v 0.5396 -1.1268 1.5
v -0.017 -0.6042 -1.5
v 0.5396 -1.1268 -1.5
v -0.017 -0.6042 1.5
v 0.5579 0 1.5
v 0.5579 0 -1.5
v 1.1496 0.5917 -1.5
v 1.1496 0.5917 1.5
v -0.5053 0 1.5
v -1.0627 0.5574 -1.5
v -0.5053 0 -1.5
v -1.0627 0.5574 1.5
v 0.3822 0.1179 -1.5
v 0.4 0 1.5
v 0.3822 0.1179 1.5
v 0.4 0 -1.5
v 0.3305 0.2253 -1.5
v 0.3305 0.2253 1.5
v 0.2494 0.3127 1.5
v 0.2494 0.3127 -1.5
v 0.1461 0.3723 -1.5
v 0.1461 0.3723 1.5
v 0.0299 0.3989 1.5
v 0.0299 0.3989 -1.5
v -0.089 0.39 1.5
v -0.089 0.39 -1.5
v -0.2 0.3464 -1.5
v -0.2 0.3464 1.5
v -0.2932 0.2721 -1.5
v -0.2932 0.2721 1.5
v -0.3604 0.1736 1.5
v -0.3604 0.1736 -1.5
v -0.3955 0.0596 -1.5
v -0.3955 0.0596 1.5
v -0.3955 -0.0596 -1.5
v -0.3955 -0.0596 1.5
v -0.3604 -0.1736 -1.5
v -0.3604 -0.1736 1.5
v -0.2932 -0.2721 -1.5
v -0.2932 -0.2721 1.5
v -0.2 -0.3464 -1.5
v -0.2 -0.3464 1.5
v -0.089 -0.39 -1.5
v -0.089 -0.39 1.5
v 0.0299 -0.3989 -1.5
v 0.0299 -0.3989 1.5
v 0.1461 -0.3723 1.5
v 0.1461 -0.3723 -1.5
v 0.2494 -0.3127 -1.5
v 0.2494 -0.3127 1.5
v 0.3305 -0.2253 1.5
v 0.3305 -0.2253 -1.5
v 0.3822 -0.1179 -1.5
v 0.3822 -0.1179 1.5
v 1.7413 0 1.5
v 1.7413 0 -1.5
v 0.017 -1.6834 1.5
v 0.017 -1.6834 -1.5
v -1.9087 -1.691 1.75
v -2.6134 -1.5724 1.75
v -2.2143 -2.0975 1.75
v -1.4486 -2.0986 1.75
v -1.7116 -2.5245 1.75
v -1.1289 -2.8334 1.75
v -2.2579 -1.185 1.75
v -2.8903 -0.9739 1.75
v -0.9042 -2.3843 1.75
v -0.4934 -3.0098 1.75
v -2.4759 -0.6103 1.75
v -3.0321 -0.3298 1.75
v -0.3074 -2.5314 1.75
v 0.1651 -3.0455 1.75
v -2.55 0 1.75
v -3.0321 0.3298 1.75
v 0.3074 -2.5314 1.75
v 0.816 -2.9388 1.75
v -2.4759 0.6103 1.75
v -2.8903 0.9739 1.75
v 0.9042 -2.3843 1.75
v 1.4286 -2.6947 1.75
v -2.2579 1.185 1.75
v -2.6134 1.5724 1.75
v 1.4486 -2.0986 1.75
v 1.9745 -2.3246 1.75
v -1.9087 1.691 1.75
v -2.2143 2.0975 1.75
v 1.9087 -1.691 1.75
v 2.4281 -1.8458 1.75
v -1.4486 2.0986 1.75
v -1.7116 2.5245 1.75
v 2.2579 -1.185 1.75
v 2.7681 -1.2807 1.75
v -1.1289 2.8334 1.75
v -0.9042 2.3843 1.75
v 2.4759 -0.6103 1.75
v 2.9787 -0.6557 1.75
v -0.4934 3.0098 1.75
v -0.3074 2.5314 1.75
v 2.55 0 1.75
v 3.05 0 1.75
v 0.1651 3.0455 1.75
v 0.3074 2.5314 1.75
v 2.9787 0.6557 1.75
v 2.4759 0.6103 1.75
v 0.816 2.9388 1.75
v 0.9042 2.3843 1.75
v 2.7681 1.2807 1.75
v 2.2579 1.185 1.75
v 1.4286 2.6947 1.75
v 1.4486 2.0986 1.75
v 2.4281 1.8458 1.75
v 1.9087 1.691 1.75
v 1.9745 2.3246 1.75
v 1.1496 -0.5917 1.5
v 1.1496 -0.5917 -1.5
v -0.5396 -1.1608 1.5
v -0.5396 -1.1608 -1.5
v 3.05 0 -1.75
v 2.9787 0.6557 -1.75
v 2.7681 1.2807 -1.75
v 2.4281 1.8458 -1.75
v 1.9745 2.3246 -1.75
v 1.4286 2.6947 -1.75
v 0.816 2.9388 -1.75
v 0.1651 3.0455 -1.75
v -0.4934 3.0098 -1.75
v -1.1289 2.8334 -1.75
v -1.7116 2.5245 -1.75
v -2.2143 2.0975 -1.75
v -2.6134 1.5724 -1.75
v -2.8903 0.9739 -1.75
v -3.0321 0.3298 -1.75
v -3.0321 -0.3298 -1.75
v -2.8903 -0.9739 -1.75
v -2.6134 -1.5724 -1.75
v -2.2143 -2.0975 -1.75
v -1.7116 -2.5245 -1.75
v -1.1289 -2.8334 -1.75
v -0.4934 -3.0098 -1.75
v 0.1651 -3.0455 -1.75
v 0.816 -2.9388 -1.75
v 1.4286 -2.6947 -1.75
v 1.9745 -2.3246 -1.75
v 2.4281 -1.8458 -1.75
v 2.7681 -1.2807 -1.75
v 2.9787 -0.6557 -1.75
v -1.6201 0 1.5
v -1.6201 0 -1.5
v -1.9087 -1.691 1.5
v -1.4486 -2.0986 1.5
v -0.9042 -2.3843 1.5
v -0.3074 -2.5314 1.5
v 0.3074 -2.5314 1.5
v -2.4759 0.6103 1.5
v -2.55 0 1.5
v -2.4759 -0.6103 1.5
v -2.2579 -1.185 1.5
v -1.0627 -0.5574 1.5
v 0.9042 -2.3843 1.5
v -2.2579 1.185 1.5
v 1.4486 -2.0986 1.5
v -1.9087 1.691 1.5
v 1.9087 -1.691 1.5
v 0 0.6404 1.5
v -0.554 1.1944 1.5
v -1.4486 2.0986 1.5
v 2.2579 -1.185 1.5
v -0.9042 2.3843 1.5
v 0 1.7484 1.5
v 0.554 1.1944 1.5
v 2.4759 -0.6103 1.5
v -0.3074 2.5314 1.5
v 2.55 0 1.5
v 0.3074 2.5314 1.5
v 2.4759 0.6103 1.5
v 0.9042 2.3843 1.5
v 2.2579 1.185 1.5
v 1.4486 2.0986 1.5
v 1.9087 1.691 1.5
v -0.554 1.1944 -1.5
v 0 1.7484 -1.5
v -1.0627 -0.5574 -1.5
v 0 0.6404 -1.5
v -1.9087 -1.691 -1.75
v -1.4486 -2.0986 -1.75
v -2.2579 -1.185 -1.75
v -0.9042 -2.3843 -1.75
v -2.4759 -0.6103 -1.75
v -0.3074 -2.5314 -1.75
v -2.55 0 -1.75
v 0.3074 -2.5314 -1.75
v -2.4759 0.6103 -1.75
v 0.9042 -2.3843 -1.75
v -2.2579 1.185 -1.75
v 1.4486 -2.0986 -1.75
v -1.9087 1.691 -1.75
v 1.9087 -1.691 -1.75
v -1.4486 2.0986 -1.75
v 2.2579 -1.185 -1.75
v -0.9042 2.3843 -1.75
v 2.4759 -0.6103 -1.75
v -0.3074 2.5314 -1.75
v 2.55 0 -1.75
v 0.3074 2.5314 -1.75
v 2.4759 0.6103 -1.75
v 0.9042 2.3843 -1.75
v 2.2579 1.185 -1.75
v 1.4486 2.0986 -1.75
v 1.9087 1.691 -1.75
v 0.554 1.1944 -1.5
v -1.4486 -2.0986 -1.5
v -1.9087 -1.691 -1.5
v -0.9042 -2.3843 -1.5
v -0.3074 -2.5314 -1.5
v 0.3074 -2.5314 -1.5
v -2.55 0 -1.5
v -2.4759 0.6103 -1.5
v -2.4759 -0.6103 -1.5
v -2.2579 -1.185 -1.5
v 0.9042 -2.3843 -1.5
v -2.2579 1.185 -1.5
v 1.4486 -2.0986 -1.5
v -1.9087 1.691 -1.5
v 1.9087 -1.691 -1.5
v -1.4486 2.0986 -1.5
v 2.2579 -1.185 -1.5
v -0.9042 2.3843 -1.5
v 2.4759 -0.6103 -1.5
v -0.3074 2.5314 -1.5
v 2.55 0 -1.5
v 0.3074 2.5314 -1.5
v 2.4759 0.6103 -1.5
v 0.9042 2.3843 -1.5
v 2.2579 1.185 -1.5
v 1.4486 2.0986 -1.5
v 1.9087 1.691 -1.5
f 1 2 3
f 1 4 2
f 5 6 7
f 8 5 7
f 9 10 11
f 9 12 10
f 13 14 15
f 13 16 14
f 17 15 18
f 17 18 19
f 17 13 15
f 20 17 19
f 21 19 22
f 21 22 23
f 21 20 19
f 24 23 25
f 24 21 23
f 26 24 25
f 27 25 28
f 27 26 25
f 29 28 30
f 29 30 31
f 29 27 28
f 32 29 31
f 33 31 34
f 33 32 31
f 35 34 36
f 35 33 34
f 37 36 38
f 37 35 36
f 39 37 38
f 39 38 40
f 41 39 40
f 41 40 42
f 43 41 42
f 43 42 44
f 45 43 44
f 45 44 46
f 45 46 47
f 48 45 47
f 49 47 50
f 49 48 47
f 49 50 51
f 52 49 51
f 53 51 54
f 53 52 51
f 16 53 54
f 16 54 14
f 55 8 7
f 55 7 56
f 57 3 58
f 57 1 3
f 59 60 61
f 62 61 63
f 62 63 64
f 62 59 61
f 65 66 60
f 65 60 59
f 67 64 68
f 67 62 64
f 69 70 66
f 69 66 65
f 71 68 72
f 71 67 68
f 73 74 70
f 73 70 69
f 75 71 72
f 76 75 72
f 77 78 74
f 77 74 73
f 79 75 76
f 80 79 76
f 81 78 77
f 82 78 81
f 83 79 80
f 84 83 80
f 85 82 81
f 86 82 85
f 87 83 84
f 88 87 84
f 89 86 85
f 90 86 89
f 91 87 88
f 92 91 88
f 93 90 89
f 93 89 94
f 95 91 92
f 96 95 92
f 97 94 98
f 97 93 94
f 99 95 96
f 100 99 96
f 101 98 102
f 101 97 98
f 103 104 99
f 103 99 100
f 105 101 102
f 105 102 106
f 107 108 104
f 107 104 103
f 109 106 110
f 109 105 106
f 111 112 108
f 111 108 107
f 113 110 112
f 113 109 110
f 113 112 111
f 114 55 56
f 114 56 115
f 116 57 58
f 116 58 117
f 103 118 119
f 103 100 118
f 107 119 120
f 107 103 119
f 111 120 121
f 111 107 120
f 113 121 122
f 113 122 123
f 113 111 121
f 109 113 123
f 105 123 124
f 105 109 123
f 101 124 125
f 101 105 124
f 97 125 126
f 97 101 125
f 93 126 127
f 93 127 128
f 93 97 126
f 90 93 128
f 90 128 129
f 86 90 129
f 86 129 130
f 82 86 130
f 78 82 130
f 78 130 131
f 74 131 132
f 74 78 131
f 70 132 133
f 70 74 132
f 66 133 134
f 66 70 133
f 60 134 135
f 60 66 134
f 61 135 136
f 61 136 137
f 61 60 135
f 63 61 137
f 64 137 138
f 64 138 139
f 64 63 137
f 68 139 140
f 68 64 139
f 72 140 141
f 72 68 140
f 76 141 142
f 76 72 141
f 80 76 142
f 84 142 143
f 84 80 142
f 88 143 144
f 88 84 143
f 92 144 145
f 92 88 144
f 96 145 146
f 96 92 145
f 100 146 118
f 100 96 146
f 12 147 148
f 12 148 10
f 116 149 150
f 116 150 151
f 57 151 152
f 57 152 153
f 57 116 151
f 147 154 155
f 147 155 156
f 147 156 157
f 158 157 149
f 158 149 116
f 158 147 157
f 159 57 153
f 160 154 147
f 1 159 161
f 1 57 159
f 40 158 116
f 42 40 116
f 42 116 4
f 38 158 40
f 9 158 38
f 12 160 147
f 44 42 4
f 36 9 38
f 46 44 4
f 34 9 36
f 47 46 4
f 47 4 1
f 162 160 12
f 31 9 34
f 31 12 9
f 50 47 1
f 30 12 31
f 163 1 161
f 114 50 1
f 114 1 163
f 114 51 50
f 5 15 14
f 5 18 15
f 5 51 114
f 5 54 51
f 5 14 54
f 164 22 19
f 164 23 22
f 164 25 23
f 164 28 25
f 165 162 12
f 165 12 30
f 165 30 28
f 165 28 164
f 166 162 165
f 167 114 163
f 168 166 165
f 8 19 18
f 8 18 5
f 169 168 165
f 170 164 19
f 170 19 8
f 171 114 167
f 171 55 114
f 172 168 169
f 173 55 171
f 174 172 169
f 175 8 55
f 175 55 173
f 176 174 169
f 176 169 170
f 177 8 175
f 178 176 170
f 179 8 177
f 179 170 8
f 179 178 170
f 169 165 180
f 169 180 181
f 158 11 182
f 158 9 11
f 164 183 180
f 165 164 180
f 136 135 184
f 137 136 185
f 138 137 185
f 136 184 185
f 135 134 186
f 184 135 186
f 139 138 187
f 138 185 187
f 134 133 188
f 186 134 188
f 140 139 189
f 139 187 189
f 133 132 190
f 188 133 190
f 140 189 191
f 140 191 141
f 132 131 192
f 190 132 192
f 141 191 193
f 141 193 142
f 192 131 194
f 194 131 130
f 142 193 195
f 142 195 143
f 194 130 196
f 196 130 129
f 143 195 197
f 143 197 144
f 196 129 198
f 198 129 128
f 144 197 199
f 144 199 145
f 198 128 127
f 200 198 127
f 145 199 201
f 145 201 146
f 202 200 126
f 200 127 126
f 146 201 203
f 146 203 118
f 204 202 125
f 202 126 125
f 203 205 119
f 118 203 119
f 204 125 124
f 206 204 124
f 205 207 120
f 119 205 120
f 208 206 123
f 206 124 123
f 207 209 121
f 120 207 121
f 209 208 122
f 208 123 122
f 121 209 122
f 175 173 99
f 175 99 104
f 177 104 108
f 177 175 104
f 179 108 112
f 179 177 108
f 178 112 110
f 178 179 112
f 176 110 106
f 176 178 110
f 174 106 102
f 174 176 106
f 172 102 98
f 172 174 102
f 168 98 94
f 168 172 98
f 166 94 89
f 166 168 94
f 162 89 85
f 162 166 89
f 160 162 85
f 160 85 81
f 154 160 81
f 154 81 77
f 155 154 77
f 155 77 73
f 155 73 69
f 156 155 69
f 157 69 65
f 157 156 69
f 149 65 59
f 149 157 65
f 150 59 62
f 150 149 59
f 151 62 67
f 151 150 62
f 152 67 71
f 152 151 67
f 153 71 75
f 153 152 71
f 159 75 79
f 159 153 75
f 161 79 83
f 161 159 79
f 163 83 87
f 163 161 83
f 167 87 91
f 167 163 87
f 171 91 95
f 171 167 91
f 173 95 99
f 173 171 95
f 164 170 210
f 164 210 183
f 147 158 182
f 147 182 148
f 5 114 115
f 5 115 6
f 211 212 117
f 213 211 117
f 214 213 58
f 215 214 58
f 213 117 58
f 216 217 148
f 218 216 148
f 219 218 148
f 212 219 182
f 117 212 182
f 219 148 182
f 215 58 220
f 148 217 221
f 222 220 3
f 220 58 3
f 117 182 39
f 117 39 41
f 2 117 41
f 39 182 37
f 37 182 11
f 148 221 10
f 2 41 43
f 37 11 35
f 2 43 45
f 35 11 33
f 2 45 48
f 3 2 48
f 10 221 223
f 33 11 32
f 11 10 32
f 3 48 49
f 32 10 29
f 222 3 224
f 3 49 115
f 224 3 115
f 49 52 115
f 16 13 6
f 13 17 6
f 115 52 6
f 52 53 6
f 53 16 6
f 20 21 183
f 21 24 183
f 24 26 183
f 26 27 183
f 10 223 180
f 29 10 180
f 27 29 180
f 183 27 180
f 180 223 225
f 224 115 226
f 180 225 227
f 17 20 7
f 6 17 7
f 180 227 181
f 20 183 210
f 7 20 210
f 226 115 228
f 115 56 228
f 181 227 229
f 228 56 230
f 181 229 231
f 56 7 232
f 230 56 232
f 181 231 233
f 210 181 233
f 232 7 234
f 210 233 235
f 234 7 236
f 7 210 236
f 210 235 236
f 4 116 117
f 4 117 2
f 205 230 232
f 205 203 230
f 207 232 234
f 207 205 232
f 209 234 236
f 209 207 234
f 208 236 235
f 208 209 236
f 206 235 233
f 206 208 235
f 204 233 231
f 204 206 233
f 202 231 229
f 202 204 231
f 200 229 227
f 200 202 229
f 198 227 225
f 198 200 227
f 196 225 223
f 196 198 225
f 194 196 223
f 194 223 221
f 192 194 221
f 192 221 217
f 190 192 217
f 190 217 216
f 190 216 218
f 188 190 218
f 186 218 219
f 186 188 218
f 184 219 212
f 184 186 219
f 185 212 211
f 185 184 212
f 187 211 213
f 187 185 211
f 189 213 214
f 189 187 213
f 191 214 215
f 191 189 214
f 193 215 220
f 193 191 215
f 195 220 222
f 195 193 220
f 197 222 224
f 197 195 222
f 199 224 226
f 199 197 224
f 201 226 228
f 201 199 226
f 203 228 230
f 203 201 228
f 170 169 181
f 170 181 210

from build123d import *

# Parameters (mm, degrees)
F0_R     = 2.55
F0_R_2   = 0.4
F1_DEPTH = 1.5
F0_R_3   = 3.05
F2_DEPTH = 1.75


with BuildPart() as f1:
    # F0 (on Top) → F1 (new body, symmetric)
    with BuildSketch(Plane.XY):
        Circle(F0_R)
        Polygon((0.016979, -1.683443), (-0.539635, -1.160787), (-0.016979, -0.604173), (0.539635, -1.126829), align=None, mode=Mode.SUBTRACT)
        Polygon((-1.062697, -0.557362), (-1.620059, 0), (-1.062697, 0.557362), (-0.505335, 0), align=None, mode=Mode.SUBTRACT)
        Circle(F0_R_2, mode=Mode.SUBTRACT)
        Polygon((1.1496, -0.591661), (0.55794, 0), (1.1496, 0.591661), (1.741261, 0), align=None, mode=Mode.SUBTRACT)
        Polygon((0, 0.640351), (-0.554009, 1.19436), (0, 1.748368), (0.554009, 1.19436), align=None, mode=Mode.SUBTRACT)
    extrude(amount=F1_DEPTH, both=True)

    # F0 (on Top) → F2 (join, symmetric)
    with BuildSketch(Plane.XY):
        Circle(F0_R_3)
        Circle(F0_R, mode=Mode.SUBTRACT)
    extrude(amount=F2_DEPTH, both=True)


solid = f1.part
